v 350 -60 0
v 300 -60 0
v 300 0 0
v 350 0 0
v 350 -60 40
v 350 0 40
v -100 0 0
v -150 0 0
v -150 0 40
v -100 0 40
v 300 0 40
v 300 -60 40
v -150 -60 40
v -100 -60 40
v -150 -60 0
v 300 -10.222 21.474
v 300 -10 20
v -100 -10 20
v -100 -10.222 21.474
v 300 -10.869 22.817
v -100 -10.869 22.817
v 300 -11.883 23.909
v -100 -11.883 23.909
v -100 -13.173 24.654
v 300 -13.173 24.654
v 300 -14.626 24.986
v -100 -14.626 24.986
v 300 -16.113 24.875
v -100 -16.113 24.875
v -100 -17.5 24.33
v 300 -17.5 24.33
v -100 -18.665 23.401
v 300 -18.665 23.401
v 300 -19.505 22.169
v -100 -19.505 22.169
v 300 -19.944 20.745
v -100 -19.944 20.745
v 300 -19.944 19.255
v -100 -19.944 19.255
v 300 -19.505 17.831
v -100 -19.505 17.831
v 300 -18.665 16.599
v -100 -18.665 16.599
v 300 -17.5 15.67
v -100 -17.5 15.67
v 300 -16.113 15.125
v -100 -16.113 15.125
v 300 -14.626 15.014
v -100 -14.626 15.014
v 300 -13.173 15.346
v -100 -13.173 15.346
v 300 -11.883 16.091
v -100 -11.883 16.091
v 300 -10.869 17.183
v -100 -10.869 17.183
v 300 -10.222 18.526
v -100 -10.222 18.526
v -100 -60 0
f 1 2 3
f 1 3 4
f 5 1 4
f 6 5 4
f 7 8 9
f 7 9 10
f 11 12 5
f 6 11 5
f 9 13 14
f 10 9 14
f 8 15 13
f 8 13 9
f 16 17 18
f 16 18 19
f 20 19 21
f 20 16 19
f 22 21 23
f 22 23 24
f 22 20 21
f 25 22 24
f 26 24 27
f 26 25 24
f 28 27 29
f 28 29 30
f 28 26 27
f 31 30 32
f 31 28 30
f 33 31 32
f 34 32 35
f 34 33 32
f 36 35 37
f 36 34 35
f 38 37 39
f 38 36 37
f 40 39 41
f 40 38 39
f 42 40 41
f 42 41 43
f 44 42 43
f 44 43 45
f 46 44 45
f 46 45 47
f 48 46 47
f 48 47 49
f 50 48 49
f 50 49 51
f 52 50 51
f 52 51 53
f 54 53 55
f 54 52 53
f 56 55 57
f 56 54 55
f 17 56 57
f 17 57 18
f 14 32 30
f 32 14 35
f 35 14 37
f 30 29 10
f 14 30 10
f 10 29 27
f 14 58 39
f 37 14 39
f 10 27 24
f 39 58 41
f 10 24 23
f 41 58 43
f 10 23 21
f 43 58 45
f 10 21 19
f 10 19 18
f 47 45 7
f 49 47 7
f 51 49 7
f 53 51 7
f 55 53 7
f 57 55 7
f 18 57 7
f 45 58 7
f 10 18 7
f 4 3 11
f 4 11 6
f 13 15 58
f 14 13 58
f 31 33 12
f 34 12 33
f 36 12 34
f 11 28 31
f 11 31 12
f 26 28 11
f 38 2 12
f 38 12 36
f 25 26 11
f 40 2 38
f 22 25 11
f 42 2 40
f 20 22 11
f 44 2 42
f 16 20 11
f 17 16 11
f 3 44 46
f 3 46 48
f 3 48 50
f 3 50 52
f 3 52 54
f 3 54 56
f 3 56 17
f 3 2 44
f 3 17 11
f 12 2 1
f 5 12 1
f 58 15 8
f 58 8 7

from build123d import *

# Parameters (mm, degrees)
F0_W     = 50
F0_H     = 60
F1_DEPTH = 40
F3_START = -50
F2_R     = 5
F3_DEPTH = 400


with BuildPart() as f1:
    # F0 (on Top) → F1 (new body)
    with BuildSketch(Plane.XY):
        with Locations((-125, -30)):
            Rectangle(F0_W, F0_H)
    extrude(amount=F1_DEPTH)



with BuildPart() as f1b:
    # F0 (on Top) → F1, piece 2 (new body)
    with BuildSketch(Plane.XY):
        with Locations((325, -30)):
            Rectangle(F0_W, F0_H)
    extrude(amount=F1_DEPTH)


with BuildPart() as f1_1:
    add(f1.part)

    add(f1b.part)  # F3 merges F1b
    # F2 (on face) → F3 (join)
    with BuildSketch(Plane.YZ.offset(350).offset(F3_START)):
        with Locations((-15, 20)):
            Circle(F2_R)
    extrude(amount=-F3_DEPTH)


solid = f1_1.part
